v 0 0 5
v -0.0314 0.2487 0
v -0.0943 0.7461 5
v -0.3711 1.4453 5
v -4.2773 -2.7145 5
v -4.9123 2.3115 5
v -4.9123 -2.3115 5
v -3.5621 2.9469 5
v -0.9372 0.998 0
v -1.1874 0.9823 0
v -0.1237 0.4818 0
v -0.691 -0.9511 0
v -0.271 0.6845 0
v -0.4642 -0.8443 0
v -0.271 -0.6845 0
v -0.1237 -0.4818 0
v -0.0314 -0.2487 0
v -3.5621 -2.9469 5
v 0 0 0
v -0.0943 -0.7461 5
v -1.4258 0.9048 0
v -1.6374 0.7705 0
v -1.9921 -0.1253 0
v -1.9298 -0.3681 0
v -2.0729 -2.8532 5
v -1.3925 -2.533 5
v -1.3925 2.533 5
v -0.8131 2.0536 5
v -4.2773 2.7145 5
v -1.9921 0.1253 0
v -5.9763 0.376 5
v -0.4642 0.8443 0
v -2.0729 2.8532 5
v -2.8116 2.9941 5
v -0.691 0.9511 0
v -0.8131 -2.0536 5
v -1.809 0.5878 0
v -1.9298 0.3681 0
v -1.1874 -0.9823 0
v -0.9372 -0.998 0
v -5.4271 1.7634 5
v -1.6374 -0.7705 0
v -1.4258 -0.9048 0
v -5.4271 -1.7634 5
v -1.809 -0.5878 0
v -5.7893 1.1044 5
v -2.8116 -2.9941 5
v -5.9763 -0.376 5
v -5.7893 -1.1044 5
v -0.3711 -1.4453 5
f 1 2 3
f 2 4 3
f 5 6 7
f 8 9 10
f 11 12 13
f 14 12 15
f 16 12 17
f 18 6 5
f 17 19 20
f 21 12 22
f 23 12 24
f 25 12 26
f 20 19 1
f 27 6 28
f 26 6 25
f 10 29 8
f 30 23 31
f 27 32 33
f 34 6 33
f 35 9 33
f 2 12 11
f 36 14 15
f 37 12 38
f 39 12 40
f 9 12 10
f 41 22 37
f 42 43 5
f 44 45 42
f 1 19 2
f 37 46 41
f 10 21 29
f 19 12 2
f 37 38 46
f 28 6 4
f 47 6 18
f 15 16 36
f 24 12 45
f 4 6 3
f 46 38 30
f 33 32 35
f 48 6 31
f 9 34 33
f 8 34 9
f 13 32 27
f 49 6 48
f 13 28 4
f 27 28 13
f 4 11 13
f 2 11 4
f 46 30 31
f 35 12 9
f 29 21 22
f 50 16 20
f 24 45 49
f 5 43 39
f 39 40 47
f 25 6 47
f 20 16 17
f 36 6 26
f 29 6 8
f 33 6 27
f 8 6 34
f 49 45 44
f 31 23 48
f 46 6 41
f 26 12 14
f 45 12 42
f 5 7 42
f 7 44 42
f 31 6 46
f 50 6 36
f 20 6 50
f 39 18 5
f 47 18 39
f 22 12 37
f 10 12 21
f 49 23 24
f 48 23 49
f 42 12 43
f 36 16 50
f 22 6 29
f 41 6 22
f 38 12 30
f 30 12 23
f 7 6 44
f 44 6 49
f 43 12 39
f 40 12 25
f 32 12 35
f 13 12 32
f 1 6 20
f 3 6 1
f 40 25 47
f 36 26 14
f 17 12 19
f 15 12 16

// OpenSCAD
raio = 3;
raioDeBaixo = 1;
altura = 5;
numeroDeFaces = 25;

module cone(raio,raioDeBaixo,altura,numeroDeFaces){
    hull(){
    translate([-raio,0, altura])cylinder(0.00001,raio,raio,$fn=numeroDeFaces);
    
    translate([-raioDeBaixo,0, 0])cylinder(0.00001,raioDeBaixo,raioDeBaixo,$fn=numeroDeFaces);
}
}
cone(raio,raioDeBaixo,altura,numeroDeFaces);
